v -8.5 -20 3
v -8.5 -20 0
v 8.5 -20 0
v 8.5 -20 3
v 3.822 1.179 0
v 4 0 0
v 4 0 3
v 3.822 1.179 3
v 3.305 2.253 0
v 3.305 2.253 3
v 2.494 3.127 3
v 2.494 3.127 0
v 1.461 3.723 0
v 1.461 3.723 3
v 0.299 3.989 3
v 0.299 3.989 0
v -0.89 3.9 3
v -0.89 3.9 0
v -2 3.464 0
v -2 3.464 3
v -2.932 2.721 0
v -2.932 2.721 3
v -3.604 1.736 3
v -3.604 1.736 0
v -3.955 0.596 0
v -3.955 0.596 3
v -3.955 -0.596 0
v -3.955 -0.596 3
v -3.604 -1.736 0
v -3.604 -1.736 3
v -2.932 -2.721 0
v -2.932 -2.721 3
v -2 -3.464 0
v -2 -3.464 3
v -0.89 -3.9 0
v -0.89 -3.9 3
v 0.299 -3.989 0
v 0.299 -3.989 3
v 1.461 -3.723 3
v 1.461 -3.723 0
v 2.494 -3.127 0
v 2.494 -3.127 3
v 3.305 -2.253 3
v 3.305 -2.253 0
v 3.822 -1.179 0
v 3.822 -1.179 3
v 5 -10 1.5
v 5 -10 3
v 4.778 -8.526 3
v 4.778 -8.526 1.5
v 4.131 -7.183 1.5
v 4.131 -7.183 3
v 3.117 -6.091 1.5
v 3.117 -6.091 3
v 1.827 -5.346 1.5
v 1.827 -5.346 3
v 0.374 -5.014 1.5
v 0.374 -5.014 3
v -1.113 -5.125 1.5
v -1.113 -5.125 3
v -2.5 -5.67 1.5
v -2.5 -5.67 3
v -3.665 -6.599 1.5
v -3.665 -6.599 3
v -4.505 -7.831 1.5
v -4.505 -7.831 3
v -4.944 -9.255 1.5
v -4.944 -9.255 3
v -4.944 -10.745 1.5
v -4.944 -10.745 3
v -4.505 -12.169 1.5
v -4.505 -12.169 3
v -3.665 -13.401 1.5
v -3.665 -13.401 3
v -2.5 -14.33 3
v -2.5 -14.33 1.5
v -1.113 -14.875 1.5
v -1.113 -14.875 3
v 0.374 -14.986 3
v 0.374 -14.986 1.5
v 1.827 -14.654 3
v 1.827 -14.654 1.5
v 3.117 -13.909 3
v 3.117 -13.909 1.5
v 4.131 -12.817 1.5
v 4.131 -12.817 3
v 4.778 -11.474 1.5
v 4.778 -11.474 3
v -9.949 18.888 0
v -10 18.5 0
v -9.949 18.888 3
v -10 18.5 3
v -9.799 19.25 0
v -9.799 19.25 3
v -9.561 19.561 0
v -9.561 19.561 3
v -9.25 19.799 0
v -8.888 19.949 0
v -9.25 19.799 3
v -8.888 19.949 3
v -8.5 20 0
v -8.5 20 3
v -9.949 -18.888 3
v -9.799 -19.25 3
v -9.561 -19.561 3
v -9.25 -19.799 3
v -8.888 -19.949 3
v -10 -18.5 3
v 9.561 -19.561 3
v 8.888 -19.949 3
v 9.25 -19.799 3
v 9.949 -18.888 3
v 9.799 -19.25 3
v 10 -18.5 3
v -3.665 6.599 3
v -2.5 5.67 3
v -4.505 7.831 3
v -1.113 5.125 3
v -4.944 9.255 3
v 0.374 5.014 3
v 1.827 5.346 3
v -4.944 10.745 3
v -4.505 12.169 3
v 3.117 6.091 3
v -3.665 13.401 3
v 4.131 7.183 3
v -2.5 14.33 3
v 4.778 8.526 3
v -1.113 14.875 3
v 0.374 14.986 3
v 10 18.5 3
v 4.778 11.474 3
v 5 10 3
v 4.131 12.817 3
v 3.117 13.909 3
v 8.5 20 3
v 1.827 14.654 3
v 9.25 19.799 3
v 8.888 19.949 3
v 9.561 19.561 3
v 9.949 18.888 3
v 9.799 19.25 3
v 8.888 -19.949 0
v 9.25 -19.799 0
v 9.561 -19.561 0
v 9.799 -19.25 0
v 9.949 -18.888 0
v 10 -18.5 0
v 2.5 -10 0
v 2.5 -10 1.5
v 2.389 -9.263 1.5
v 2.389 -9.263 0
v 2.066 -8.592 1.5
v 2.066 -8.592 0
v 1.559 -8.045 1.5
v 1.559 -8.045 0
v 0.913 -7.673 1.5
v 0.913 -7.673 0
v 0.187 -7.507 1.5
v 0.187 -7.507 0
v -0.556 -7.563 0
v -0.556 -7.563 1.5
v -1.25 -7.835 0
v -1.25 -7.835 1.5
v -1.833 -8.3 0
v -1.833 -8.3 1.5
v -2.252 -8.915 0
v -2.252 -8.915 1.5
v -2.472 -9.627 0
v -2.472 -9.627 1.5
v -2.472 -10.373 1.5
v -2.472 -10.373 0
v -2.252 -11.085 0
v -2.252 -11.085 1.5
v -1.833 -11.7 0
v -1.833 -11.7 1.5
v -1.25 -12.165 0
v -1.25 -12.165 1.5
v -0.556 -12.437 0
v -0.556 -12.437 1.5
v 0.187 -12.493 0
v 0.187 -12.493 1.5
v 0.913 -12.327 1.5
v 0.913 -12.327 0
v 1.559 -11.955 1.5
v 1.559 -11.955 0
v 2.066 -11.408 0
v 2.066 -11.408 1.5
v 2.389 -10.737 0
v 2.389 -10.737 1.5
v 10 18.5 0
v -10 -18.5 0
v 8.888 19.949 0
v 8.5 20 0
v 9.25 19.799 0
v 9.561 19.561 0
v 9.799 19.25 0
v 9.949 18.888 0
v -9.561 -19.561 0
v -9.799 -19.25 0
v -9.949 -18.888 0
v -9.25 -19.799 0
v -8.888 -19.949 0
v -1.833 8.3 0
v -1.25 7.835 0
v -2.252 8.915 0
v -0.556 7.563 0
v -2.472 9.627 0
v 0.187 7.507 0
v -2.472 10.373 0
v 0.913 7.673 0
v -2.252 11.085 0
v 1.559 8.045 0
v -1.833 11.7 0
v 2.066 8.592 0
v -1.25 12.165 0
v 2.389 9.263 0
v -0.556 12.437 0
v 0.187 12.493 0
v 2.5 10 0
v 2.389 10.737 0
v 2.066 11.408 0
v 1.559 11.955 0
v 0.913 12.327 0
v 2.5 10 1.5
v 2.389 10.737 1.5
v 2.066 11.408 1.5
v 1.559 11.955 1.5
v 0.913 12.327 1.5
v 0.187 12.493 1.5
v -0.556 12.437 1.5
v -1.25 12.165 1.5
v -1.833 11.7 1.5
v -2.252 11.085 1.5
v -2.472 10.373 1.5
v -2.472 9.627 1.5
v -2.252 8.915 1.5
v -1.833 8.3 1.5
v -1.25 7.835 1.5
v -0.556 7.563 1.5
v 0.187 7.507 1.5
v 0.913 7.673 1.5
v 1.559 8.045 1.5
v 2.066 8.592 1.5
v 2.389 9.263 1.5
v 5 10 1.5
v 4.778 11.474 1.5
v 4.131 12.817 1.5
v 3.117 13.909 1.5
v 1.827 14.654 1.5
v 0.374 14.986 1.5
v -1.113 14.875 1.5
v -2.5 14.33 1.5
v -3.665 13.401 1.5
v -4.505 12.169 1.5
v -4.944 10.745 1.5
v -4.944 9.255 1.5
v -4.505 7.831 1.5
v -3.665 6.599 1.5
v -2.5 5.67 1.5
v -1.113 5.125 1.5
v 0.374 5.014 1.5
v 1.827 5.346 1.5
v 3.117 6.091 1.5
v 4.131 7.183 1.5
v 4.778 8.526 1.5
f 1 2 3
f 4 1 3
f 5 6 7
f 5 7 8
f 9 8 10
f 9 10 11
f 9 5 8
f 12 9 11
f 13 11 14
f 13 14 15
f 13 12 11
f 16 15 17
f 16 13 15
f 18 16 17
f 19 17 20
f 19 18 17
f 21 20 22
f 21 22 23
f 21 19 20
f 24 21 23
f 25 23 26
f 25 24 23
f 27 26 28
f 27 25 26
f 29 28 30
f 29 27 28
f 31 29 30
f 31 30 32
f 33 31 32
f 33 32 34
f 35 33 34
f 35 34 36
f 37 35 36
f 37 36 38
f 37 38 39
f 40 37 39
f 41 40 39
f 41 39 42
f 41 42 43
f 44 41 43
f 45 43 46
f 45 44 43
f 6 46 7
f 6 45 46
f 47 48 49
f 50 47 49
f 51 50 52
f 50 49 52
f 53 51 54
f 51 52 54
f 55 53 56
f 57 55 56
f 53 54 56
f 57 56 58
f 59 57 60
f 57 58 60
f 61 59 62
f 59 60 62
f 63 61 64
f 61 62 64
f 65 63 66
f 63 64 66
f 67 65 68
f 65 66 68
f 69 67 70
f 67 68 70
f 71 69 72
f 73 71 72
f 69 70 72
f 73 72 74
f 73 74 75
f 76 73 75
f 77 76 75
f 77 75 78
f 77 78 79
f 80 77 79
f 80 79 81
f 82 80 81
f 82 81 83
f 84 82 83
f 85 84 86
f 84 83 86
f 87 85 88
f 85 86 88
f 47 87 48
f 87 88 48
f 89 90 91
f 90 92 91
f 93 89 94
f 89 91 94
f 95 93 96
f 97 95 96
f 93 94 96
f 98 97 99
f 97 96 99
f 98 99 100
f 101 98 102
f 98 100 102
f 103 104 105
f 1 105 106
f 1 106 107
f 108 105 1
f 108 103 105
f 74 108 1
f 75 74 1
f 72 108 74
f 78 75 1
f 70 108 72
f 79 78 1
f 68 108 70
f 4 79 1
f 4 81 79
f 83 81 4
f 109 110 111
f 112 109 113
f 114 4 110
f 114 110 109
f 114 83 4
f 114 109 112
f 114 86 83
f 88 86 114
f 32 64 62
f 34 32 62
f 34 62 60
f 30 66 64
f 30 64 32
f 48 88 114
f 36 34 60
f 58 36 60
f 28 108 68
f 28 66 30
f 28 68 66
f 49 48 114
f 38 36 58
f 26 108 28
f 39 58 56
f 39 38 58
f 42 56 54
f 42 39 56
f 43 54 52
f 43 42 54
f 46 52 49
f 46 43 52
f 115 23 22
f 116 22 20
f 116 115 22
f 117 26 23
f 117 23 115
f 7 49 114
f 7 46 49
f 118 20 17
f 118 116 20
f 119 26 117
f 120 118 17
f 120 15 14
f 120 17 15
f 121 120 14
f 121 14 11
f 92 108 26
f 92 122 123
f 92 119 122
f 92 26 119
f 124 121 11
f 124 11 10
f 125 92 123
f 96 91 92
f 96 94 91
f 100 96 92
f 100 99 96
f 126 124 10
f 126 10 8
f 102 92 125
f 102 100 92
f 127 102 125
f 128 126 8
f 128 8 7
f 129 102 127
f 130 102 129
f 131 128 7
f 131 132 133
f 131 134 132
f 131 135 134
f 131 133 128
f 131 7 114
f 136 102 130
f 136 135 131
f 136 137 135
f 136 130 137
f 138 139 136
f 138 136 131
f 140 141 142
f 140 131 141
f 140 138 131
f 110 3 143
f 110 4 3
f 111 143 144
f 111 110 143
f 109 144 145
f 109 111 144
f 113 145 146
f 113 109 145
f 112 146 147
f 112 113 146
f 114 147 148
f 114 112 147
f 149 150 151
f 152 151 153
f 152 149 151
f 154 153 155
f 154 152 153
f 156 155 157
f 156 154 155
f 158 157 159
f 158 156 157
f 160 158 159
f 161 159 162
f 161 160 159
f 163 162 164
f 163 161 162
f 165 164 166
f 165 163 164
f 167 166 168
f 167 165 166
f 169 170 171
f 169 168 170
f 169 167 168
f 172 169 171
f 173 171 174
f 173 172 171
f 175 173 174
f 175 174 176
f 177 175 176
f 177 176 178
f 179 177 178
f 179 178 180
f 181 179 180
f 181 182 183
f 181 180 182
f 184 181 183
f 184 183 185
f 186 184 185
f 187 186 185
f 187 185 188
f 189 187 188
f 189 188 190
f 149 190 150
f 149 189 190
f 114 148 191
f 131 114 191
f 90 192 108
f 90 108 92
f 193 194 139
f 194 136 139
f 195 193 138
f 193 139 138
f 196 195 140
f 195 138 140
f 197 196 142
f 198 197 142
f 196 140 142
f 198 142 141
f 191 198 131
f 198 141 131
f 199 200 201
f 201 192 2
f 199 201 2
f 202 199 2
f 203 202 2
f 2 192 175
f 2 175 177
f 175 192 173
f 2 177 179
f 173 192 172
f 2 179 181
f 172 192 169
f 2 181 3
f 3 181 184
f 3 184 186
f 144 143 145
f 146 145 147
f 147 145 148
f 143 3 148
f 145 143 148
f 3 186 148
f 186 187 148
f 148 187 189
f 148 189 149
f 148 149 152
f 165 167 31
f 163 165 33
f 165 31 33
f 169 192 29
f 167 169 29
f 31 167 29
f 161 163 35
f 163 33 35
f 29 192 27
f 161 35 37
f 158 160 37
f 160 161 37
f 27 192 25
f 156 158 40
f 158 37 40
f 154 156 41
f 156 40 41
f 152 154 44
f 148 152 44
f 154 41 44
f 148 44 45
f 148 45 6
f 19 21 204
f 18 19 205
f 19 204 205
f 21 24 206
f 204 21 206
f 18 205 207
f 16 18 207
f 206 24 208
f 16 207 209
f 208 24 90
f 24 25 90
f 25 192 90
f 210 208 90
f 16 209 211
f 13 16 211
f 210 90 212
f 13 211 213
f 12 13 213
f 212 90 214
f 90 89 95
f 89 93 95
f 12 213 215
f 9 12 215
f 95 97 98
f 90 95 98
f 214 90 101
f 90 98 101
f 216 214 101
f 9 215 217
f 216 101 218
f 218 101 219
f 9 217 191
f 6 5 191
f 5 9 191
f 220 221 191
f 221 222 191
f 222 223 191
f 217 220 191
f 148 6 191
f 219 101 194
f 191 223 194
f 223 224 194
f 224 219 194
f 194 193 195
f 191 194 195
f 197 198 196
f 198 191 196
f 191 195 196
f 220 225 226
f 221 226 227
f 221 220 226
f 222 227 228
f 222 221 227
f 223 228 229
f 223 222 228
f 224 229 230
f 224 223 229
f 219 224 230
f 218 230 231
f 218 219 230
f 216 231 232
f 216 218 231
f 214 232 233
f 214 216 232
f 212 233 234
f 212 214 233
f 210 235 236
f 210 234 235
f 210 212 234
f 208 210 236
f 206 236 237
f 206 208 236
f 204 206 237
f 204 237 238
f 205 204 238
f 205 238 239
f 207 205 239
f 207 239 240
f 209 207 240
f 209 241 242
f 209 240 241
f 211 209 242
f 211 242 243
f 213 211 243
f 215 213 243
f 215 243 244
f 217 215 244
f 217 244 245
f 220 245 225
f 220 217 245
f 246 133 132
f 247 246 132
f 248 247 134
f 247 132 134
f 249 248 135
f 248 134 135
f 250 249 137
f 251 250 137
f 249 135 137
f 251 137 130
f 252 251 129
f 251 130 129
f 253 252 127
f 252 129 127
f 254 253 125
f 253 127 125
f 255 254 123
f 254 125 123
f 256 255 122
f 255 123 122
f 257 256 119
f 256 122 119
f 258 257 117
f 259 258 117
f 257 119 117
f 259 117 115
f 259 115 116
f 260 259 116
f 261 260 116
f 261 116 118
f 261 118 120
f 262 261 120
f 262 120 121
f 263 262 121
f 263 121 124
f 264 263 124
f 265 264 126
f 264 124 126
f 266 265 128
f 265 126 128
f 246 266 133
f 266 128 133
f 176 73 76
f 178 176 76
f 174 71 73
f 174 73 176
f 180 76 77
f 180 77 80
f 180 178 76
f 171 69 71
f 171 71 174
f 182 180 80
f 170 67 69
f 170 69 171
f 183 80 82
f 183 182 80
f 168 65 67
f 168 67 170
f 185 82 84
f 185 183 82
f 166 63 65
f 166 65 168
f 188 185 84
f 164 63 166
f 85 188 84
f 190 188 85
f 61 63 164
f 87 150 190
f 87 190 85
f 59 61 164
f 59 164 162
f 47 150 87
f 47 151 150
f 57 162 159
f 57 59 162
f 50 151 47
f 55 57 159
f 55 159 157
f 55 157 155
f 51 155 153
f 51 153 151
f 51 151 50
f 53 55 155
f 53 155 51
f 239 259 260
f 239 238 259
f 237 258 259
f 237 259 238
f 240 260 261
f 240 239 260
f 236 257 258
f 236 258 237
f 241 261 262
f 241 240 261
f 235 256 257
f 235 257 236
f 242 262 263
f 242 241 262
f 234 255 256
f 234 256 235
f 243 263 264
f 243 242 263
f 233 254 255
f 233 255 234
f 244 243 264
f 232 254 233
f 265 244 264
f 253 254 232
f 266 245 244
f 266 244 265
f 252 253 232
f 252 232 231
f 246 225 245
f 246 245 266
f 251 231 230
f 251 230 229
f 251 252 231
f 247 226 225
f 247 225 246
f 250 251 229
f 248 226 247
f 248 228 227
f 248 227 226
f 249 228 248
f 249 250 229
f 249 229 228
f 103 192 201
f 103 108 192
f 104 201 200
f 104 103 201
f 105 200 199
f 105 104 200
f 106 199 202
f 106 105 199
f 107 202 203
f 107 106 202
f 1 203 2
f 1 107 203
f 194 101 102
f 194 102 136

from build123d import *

# Parameters (mm, degrees)
SKETCH1_W           = 20
SKETCH1_H           = 40
SKETCH1_R           = 2.5
SKETCH1_R_2         = 4
BOSS_EXTRUDE1_DEPTH = 3
SKETCH2_R           = 5
CUT_EXTRUDE1_DEPTH  = 1.5
FILLET1_R           = 1.5


with BuildPart() as part:
    # Sketch1 → Boss-Extrude1 (new body)
    with BuildSketch(Plane.XY):
        Rectangle(SKETCH1_W, SKETCH1_H)
        with Locations((0, -10)):
            Circle(SKETCH1_R, mode=Mode.SUBTRACT)
        with Locations((0, 10)):
            Circle(SKETCH1_R, mode=Mode.SUBTRACT)
        Circle(SKETCH1_R_2, mode=Mode.SUBTRACT)
    extrude(amount=BOSS_EXTRUDE1_DEPTH)

    # Sketch2 → Cut-Extrude1 (cut)
    with BuildSketch(Plane.XY.offset(3)):
        with Locations((0, -10)):
            Circle(SKETCH2_R)
        with Locations((0, 10)):
            Circle(SKETCH2_R)
    extrude(amount=-CUT_EXTRUDE1_DEPTH, mode=Mode.SUBTRACT)

    # Fillet1
    fillet1_edges = [part.edges().sort_by_distance(p)[0] for p in [
        (-10, 20, 1.5),
        (10, 20, 1.5),
        (10, -20, 1.5),
        (-10, -20, 1.5),
    ]]
    fillet(fillet1_edges, radius=FILLET1_R)


solid = part.part
